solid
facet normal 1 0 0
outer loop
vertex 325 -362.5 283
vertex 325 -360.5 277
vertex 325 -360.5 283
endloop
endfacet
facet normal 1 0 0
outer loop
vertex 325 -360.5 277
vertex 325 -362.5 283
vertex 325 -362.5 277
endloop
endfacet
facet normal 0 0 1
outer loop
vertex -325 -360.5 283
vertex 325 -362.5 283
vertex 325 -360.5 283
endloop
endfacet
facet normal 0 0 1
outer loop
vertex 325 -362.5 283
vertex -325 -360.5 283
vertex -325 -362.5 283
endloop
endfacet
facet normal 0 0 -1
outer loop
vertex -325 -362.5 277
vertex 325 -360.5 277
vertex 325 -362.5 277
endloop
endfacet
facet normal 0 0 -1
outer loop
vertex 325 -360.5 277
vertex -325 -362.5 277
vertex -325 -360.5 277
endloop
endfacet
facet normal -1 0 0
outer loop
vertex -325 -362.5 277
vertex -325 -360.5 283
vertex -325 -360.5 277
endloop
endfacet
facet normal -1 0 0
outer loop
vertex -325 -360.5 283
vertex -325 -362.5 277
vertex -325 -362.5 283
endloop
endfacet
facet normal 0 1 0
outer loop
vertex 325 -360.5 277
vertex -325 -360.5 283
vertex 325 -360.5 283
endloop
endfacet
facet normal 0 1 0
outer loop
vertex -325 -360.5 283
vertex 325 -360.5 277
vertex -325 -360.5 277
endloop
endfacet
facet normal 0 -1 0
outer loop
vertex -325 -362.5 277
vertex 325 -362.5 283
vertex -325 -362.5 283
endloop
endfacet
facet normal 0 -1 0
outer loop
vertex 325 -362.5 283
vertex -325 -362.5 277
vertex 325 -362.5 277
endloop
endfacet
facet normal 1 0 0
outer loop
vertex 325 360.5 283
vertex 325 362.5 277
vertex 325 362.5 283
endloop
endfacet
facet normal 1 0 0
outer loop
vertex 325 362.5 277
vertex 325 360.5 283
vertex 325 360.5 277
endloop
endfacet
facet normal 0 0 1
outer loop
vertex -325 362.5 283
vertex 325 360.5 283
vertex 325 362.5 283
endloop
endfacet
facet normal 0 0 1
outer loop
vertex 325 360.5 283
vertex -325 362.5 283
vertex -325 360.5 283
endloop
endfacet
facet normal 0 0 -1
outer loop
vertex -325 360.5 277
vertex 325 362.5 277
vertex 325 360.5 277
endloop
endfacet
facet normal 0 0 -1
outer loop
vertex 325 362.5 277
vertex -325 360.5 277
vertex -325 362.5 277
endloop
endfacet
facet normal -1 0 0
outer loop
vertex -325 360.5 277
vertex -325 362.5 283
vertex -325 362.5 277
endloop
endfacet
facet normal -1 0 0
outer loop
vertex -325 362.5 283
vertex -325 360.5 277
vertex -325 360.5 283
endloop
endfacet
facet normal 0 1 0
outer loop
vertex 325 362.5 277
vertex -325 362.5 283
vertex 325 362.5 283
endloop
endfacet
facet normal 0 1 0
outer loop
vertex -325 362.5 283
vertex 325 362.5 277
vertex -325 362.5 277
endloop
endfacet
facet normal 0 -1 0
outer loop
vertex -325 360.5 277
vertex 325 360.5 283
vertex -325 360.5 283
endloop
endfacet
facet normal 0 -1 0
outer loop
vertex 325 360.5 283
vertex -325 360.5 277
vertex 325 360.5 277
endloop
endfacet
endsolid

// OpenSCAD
export_only = true;
include <main.scad>
body_status_lights();
